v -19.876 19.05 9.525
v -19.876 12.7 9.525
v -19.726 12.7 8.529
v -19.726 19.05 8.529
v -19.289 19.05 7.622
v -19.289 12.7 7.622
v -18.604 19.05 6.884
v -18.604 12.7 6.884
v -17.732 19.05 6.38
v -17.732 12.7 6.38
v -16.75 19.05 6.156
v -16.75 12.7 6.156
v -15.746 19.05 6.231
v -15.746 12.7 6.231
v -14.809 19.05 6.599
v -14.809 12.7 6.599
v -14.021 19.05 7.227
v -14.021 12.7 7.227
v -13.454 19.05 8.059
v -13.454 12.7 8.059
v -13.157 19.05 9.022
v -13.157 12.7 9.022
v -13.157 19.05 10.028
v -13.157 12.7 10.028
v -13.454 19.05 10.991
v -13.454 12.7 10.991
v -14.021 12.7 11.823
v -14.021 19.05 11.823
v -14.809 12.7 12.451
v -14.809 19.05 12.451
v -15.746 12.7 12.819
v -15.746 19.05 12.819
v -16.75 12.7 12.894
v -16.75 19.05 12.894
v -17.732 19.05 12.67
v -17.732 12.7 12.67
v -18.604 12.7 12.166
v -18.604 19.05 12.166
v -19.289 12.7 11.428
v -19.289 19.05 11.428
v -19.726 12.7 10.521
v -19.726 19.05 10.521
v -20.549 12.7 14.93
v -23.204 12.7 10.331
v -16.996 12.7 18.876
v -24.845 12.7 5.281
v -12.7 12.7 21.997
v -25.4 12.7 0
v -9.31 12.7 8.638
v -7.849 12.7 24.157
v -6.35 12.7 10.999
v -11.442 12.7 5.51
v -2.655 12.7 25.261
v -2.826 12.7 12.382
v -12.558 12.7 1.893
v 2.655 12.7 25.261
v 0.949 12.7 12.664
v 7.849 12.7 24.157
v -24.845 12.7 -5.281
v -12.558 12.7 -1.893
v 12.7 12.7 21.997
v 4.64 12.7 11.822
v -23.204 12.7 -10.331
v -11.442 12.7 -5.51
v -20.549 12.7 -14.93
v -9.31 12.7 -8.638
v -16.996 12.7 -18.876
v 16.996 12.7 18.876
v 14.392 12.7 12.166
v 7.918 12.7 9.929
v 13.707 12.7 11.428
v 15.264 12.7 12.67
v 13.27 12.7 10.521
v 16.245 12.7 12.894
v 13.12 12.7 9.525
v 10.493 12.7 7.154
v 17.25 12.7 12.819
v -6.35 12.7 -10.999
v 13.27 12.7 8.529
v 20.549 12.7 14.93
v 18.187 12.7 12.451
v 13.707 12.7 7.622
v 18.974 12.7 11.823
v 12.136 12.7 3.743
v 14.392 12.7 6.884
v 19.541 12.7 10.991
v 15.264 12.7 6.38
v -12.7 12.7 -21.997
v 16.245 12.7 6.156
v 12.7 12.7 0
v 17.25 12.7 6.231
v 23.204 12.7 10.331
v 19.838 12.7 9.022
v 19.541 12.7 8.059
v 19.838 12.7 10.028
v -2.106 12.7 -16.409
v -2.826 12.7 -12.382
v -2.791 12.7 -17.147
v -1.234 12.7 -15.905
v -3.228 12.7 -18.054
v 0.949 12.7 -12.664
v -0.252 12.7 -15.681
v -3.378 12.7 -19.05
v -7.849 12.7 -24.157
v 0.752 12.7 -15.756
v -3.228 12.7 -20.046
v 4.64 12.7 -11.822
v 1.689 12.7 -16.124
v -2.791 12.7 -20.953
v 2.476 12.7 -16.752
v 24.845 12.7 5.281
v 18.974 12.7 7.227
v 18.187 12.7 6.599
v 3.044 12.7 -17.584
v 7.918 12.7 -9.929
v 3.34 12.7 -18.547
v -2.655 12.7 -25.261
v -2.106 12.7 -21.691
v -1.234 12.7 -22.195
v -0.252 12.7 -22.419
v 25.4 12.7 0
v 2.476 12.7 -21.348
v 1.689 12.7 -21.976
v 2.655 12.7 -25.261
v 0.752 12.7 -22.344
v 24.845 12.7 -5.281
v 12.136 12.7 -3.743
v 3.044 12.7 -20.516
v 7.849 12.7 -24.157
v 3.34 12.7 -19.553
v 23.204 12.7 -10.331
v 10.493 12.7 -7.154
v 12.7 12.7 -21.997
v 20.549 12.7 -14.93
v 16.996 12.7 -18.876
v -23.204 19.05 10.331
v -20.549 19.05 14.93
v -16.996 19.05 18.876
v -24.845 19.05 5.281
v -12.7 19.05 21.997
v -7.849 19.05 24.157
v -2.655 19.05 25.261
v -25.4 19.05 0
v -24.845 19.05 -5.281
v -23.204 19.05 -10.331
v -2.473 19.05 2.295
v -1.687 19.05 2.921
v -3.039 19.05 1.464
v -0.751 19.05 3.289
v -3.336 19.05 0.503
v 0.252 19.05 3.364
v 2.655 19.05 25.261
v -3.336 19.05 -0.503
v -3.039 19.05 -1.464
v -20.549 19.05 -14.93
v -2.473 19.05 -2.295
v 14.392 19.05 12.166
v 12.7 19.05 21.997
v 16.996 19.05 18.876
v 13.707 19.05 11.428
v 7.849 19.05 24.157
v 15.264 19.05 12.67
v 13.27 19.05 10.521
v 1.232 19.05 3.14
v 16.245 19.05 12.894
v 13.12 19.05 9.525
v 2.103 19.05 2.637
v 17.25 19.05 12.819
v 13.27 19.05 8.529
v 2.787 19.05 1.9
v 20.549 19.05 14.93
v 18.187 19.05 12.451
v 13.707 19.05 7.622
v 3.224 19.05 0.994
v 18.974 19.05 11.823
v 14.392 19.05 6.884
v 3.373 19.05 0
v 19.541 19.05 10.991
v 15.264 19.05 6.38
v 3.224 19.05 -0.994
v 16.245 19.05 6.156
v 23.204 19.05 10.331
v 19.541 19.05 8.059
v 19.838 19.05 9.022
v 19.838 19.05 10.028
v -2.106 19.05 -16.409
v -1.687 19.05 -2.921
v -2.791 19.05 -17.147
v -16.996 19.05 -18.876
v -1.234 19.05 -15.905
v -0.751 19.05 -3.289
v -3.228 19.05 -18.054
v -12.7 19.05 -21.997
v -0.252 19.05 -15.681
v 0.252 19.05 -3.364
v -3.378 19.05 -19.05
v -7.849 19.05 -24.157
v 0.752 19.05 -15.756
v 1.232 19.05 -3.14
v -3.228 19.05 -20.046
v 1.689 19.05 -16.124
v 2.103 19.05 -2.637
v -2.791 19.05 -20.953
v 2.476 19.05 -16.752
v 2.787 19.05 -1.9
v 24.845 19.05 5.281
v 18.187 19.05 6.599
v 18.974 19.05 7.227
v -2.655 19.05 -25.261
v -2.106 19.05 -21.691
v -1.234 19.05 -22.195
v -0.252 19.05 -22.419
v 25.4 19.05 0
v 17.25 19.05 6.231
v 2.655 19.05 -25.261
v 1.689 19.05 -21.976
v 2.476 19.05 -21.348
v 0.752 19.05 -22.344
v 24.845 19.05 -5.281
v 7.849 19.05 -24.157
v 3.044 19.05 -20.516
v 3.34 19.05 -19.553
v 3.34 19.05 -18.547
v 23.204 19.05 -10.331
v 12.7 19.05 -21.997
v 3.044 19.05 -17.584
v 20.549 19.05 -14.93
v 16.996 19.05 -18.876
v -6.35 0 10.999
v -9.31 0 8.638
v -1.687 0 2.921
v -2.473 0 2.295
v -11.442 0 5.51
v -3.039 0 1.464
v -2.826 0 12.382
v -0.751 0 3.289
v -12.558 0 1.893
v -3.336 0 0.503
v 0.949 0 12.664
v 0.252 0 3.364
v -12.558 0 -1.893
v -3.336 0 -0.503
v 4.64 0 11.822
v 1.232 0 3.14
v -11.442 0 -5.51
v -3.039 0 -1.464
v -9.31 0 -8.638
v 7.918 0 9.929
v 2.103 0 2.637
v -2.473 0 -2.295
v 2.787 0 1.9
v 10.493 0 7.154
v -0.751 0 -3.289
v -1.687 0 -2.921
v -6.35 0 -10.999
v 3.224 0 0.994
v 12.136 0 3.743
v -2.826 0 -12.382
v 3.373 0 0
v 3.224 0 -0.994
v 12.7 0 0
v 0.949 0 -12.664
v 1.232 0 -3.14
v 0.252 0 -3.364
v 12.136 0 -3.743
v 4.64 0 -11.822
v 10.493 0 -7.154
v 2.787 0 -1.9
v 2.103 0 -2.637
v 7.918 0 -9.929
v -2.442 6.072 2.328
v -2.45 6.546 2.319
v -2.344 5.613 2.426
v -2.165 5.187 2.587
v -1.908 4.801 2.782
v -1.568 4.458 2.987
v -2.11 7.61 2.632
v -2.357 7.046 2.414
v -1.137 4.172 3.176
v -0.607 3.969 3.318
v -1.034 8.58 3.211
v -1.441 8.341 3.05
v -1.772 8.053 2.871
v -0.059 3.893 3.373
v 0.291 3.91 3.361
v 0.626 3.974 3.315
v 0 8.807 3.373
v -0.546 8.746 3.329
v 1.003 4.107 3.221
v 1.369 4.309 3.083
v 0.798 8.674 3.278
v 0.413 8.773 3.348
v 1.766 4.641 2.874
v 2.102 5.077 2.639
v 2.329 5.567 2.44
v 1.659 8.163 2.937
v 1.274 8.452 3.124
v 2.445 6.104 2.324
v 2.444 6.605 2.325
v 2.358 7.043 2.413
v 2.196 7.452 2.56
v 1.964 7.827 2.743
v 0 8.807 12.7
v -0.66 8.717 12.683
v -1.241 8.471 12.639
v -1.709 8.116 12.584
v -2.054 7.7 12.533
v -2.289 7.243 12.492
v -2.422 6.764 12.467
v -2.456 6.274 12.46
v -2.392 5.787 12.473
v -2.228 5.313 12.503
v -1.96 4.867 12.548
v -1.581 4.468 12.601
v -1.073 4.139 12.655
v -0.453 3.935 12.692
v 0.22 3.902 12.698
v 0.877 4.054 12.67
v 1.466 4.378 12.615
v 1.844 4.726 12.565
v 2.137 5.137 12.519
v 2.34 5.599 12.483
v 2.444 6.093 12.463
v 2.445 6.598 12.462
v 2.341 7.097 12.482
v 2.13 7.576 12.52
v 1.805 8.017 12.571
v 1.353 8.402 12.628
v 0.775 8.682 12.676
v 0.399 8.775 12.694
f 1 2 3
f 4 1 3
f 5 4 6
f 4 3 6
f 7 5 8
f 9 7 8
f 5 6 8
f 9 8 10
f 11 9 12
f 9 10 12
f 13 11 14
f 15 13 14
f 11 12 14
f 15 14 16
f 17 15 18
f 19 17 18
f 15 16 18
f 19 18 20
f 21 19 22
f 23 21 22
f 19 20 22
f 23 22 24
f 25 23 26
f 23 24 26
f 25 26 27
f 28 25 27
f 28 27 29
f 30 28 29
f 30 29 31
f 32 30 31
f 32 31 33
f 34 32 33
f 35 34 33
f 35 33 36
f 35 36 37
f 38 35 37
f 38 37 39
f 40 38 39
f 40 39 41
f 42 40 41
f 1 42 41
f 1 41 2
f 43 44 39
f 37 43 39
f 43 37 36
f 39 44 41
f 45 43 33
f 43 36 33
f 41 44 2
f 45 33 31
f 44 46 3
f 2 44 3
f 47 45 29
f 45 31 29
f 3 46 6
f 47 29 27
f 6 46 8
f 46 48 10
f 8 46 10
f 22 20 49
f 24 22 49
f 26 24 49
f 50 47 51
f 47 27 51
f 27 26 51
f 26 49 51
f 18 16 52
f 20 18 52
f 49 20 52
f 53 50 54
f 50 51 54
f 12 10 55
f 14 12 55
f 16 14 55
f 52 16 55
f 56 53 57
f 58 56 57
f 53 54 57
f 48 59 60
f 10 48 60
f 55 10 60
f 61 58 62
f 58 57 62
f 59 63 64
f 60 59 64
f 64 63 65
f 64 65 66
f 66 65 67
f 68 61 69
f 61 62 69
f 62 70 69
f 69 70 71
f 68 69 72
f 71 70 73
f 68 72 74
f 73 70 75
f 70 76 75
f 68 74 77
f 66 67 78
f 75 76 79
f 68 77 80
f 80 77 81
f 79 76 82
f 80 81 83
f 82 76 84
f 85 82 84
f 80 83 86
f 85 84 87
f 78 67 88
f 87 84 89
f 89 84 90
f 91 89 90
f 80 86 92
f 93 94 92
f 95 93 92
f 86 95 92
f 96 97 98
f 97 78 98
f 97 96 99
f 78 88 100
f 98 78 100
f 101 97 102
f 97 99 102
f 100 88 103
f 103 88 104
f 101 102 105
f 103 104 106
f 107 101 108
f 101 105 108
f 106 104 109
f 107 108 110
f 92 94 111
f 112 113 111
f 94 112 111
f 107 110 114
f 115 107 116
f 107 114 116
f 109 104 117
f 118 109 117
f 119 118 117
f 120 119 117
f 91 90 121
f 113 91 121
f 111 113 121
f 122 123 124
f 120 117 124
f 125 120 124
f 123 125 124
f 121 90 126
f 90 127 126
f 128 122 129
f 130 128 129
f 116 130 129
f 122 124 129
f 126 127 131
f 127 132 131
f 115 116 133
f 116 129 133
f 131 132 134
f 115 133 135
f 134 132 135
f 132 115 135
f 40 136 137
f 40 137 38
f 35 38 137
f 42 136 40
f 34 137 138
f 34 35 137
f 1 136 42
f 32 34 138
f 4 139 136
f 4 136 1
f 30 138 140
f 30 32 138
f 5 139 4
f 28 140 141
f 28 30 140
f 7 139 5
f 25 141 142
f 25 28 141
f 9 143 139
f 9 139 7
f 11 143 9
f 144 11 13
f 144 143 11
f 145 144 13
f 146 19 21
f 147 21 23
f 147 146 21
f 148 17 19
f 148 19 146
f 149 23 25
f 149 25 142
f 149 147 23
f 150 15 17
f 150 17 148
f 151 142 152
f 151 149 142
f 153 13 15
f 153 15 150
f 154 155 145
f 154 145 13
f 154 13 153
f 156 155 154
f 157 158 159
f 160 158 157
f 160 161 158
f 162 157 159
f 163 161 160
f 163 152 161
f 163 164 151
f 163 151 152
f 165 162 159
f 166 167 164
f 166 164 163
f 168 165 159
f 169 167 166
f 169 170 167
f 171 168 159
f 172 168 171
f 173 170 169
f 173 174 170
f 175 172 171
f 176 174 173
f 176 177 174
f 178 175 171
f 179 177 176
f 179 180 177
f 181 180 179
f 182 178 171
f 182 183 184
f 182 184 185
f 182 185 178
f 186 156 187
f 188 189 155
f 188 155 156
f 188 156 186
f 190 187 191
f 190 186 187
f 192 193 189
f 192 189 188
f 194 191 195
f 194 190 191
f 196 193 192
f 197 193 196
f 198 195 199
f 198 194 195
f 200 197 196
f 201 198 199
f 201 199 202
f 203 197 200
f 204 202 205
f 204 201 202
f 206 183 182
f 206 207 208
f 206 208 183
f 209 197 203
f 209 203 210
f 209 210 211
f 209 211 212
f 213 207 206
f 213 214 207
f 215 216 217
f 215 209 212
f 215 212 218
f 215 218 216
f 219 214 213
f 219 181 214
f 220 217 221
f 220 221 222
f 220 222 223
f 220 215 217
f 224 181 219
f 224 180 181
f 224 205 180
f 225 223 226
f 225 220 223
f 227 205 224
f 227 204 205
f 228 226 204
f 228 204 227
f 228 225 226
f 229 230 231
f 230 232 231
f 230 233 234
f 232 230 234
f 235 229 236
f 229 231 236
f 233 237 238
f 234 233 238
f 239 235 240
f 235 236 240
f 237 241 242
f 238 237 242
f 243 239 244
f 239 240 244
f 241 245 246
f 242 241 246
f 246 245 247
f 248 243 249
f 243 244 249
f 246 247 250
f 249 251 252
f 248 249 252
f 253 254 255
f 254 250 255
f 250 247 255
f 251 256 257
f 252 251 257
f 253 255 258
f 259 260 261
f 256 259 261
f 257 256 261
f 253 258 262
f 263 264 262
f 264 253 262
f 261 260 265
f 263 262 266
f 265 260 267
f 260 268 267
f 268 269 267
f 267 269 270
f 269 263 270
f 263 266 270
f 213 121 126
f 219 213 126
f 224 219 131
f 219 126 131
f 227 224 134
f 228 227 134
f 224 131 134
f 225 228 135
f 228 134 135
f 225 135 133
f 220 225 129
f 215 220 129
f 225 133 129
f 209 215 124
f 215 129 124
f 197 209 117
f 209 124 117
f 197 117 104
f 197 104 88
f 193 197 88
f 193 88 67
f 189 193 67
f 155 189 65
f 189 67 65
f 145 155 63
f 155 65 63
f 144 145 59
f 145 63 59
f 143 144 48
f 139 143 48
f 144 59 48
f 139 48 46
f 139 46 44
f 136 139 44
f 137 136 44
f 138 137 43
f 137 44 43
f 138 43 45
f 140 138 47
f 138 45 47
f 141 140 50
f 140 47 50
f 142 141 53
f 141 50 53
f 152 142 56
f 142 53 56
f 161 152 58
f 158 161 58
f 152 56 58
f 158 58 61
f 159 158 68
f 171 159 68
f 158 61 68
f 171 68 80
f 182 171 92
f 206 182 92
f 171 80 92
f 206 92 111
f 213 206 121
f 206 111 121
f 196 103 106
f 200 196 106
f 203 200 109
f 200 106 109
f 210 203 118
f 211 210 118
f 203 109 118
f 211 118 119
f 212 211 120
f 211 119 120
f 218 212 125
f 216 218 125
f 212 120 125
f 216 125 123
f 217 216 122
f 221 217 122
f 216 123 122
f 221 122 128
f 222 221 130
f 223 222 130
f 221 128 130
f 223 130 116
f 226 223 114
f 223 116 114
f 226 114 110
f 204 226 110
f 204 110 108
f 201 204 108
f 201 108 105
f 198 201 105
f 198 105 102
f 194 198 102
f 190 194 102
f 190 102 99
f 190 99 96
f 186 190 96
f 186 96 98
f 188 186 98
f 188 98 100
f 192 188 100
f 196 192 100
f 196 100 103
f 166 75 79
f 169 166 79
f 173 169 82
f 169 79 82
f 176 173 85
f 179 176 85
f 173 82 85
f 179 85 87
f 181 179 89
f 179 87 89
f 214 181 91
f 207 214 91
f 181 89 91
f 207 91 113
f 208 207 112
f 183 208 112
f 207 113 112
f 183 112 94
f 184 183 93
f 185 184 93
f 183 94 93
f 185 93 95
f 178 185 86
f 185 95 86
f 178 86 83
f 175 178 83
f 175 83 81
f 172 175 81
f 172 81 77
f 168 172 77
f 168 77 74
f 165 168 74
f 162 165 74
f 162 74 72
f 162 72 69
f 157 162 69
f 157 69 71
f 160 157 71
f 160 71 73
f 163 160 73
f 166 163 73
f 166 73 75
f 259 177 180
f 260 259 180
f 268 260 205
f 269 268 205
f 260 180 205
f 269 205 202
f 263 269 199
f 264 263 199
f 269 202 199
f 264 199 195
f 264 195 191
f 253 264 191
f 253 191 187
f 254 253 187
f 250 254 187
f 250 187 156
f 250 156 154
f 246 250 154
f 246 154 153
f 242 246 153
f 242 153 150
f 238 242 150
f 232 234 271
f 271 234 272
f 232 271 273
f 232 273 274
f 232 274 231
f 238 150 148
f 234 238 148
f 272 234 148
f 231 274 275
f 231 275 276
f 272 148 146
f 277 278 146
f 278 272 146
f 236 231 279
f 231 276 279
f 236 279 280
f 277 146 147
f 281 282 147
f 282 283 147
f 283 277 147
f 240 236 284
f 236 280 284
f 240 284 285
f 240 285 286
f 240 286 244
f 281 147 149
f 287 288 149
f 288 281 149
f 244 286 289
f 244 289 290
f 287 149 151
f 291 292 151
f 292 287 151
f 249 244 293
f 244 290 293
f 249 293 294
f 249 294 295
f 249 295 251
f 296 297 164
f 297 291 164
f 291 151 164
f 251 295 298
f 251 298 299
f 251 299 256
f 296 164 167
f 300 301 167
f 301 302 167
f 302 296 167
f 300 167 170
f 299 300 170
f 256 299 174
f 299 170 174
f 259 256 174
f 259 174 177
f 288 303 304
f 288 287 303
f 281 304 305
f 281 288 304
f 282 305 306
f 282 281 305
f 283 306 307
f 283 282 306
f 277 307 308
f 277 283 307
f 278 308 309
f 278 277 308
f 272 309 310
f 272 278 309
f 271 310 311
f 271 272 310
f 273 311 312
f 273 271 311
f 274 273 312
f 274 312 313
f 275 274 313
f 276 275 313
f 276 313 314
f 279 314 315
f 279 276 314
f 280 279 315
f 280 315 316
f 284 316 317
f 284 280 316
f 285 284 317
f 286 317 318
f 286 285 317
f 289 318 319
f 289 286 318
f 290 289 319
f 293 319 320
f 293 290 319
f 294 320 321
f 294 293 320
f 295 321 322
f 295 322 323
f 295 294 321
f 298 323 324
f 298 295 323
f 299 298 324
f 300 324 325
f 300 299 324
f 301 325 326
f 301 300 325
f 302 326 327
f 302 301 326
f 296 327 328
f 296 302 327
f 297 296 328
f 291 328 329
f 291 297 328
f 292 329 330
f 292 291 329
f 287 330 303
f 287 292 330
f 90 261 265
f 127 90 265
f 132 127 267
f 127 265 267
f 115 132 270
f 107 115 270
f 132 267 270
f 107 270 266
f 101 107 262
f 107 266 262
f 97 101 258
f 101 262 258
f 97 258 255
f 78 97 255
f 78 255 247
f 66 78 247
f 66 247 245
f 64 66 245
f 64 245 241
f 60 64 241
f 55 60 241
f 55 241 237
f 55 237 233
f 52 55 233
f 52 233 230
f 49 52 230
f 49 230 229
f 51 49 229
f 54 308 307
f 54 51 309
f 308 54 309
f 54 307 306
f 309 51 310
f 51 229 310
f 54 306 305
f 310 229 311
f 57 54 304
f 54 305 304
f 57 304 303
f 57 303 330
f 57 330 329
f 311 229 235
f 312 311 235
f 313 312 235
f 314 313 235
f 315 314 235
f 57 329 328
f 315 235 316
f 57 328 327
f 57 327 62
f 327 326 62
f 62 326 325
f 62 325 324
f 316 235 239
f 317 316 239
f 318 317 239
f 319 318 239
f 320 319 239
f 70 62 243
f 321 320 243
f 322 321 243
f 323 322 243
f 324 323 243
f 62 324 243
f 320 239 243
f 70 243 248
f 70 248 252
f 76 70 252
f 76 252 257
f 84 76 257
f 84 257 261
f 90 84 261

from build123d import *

# Parameters (mm, degrees)
SKETCH1_R                    = 12.7
BOSS_EXTRUDE1_DEPTH          = 12.7
SKETCH2_R                    = 25.4
BOSS_EXTRUDE2_DEPTH          = 6.35
SKETCH3_R                    = 3.3734375
CUT_EXTRUDE1_DEPTH           = 20.05
H_0_266_DIAMETER_HOLE1_D     = 6.7564
H_0_266_DIAMETER_HOLE1_DEPTH = 25.4
H_0_266_DIAMETER_HOLE1_TIP   = 2.029827343


with BuildPart() as part:
    # Sketch1 → Boss-Extrude1 (new body)
    with BuildSketch(Plane(origin=(0, 0, 0), x_dir=(1, 0, 0), z_dir=(0, 1, 0))):
        Circle(SKETCH1_R)
    extrude(amount=BOSS_EXTRUDE1_DEPTH)

    # Sketch2 → Boss-Extrude2 (add)
    with BuildSketch(Plane(origin=(0, 12.7, 0), x_dir=(1, 0, 0), z_dir=(0, 1, 0))):
        Circle(SKETCH2_R)
    extrude(amount=BOSS_EXTRUDE2_DEPTH)

    # Sketch3 → Cut-Extrude1 (cut, through all)
    with BuildSketch(Plane(origin=(0, 19.05, 0), x_dir=(1, 0, 0), z_dir=(0, 1, 0))):
        Circle(SKETCH3_R)
    extrude(amount=-CUT_EXTRUDE1_DEPTH, mode=Mode.SUBTRACT)

    # H (0.266) Diameter Hole1
    with Locations(Plane(origin=(0, 19.05, 0), x_dir=(1, 0, 0), z_dir=(0, 1, 0))):
        with Locations((0, 19.05), (-16.497783942, -9.525), (16.497783942, -9.525)):
            Hole(H_0_266_DIAMETER_HOLE1_D / 2, depth=H_0_266_DIAMETER_HOLE1_DEPTH)
            with Locations((0, 0, -(H_0_266_DIAMETER_HOLE1_DEPTH + H_0_266_DIAMETER_HOLE1_TIP / 2))):  # 118° drill point
                Cone(0, H_0_266_DIAMETER_HOLE1_D / 2, H_0_266_DIAMETER_HOLE1_TIP, mode=Mode.SUBTRACT)

    # Sketch8 → #10 (0.1935) Diameter Hole1 (revolve, cut)
    with BuildSketch(Plane(origin=(0, 6.35, 0), x_dir=(0, 1, 0), z_dir=(1, 0, 0))):
        Polygon((0, 0), (0, 26.876584928), (2.45745, 25.4), (2.45745, 0), align=None)
    revolve(axis=Axis((0, 6.35, -6.35), (0, 0, 1)), mode=Mode.SUBTRACT)


solid = part.part
